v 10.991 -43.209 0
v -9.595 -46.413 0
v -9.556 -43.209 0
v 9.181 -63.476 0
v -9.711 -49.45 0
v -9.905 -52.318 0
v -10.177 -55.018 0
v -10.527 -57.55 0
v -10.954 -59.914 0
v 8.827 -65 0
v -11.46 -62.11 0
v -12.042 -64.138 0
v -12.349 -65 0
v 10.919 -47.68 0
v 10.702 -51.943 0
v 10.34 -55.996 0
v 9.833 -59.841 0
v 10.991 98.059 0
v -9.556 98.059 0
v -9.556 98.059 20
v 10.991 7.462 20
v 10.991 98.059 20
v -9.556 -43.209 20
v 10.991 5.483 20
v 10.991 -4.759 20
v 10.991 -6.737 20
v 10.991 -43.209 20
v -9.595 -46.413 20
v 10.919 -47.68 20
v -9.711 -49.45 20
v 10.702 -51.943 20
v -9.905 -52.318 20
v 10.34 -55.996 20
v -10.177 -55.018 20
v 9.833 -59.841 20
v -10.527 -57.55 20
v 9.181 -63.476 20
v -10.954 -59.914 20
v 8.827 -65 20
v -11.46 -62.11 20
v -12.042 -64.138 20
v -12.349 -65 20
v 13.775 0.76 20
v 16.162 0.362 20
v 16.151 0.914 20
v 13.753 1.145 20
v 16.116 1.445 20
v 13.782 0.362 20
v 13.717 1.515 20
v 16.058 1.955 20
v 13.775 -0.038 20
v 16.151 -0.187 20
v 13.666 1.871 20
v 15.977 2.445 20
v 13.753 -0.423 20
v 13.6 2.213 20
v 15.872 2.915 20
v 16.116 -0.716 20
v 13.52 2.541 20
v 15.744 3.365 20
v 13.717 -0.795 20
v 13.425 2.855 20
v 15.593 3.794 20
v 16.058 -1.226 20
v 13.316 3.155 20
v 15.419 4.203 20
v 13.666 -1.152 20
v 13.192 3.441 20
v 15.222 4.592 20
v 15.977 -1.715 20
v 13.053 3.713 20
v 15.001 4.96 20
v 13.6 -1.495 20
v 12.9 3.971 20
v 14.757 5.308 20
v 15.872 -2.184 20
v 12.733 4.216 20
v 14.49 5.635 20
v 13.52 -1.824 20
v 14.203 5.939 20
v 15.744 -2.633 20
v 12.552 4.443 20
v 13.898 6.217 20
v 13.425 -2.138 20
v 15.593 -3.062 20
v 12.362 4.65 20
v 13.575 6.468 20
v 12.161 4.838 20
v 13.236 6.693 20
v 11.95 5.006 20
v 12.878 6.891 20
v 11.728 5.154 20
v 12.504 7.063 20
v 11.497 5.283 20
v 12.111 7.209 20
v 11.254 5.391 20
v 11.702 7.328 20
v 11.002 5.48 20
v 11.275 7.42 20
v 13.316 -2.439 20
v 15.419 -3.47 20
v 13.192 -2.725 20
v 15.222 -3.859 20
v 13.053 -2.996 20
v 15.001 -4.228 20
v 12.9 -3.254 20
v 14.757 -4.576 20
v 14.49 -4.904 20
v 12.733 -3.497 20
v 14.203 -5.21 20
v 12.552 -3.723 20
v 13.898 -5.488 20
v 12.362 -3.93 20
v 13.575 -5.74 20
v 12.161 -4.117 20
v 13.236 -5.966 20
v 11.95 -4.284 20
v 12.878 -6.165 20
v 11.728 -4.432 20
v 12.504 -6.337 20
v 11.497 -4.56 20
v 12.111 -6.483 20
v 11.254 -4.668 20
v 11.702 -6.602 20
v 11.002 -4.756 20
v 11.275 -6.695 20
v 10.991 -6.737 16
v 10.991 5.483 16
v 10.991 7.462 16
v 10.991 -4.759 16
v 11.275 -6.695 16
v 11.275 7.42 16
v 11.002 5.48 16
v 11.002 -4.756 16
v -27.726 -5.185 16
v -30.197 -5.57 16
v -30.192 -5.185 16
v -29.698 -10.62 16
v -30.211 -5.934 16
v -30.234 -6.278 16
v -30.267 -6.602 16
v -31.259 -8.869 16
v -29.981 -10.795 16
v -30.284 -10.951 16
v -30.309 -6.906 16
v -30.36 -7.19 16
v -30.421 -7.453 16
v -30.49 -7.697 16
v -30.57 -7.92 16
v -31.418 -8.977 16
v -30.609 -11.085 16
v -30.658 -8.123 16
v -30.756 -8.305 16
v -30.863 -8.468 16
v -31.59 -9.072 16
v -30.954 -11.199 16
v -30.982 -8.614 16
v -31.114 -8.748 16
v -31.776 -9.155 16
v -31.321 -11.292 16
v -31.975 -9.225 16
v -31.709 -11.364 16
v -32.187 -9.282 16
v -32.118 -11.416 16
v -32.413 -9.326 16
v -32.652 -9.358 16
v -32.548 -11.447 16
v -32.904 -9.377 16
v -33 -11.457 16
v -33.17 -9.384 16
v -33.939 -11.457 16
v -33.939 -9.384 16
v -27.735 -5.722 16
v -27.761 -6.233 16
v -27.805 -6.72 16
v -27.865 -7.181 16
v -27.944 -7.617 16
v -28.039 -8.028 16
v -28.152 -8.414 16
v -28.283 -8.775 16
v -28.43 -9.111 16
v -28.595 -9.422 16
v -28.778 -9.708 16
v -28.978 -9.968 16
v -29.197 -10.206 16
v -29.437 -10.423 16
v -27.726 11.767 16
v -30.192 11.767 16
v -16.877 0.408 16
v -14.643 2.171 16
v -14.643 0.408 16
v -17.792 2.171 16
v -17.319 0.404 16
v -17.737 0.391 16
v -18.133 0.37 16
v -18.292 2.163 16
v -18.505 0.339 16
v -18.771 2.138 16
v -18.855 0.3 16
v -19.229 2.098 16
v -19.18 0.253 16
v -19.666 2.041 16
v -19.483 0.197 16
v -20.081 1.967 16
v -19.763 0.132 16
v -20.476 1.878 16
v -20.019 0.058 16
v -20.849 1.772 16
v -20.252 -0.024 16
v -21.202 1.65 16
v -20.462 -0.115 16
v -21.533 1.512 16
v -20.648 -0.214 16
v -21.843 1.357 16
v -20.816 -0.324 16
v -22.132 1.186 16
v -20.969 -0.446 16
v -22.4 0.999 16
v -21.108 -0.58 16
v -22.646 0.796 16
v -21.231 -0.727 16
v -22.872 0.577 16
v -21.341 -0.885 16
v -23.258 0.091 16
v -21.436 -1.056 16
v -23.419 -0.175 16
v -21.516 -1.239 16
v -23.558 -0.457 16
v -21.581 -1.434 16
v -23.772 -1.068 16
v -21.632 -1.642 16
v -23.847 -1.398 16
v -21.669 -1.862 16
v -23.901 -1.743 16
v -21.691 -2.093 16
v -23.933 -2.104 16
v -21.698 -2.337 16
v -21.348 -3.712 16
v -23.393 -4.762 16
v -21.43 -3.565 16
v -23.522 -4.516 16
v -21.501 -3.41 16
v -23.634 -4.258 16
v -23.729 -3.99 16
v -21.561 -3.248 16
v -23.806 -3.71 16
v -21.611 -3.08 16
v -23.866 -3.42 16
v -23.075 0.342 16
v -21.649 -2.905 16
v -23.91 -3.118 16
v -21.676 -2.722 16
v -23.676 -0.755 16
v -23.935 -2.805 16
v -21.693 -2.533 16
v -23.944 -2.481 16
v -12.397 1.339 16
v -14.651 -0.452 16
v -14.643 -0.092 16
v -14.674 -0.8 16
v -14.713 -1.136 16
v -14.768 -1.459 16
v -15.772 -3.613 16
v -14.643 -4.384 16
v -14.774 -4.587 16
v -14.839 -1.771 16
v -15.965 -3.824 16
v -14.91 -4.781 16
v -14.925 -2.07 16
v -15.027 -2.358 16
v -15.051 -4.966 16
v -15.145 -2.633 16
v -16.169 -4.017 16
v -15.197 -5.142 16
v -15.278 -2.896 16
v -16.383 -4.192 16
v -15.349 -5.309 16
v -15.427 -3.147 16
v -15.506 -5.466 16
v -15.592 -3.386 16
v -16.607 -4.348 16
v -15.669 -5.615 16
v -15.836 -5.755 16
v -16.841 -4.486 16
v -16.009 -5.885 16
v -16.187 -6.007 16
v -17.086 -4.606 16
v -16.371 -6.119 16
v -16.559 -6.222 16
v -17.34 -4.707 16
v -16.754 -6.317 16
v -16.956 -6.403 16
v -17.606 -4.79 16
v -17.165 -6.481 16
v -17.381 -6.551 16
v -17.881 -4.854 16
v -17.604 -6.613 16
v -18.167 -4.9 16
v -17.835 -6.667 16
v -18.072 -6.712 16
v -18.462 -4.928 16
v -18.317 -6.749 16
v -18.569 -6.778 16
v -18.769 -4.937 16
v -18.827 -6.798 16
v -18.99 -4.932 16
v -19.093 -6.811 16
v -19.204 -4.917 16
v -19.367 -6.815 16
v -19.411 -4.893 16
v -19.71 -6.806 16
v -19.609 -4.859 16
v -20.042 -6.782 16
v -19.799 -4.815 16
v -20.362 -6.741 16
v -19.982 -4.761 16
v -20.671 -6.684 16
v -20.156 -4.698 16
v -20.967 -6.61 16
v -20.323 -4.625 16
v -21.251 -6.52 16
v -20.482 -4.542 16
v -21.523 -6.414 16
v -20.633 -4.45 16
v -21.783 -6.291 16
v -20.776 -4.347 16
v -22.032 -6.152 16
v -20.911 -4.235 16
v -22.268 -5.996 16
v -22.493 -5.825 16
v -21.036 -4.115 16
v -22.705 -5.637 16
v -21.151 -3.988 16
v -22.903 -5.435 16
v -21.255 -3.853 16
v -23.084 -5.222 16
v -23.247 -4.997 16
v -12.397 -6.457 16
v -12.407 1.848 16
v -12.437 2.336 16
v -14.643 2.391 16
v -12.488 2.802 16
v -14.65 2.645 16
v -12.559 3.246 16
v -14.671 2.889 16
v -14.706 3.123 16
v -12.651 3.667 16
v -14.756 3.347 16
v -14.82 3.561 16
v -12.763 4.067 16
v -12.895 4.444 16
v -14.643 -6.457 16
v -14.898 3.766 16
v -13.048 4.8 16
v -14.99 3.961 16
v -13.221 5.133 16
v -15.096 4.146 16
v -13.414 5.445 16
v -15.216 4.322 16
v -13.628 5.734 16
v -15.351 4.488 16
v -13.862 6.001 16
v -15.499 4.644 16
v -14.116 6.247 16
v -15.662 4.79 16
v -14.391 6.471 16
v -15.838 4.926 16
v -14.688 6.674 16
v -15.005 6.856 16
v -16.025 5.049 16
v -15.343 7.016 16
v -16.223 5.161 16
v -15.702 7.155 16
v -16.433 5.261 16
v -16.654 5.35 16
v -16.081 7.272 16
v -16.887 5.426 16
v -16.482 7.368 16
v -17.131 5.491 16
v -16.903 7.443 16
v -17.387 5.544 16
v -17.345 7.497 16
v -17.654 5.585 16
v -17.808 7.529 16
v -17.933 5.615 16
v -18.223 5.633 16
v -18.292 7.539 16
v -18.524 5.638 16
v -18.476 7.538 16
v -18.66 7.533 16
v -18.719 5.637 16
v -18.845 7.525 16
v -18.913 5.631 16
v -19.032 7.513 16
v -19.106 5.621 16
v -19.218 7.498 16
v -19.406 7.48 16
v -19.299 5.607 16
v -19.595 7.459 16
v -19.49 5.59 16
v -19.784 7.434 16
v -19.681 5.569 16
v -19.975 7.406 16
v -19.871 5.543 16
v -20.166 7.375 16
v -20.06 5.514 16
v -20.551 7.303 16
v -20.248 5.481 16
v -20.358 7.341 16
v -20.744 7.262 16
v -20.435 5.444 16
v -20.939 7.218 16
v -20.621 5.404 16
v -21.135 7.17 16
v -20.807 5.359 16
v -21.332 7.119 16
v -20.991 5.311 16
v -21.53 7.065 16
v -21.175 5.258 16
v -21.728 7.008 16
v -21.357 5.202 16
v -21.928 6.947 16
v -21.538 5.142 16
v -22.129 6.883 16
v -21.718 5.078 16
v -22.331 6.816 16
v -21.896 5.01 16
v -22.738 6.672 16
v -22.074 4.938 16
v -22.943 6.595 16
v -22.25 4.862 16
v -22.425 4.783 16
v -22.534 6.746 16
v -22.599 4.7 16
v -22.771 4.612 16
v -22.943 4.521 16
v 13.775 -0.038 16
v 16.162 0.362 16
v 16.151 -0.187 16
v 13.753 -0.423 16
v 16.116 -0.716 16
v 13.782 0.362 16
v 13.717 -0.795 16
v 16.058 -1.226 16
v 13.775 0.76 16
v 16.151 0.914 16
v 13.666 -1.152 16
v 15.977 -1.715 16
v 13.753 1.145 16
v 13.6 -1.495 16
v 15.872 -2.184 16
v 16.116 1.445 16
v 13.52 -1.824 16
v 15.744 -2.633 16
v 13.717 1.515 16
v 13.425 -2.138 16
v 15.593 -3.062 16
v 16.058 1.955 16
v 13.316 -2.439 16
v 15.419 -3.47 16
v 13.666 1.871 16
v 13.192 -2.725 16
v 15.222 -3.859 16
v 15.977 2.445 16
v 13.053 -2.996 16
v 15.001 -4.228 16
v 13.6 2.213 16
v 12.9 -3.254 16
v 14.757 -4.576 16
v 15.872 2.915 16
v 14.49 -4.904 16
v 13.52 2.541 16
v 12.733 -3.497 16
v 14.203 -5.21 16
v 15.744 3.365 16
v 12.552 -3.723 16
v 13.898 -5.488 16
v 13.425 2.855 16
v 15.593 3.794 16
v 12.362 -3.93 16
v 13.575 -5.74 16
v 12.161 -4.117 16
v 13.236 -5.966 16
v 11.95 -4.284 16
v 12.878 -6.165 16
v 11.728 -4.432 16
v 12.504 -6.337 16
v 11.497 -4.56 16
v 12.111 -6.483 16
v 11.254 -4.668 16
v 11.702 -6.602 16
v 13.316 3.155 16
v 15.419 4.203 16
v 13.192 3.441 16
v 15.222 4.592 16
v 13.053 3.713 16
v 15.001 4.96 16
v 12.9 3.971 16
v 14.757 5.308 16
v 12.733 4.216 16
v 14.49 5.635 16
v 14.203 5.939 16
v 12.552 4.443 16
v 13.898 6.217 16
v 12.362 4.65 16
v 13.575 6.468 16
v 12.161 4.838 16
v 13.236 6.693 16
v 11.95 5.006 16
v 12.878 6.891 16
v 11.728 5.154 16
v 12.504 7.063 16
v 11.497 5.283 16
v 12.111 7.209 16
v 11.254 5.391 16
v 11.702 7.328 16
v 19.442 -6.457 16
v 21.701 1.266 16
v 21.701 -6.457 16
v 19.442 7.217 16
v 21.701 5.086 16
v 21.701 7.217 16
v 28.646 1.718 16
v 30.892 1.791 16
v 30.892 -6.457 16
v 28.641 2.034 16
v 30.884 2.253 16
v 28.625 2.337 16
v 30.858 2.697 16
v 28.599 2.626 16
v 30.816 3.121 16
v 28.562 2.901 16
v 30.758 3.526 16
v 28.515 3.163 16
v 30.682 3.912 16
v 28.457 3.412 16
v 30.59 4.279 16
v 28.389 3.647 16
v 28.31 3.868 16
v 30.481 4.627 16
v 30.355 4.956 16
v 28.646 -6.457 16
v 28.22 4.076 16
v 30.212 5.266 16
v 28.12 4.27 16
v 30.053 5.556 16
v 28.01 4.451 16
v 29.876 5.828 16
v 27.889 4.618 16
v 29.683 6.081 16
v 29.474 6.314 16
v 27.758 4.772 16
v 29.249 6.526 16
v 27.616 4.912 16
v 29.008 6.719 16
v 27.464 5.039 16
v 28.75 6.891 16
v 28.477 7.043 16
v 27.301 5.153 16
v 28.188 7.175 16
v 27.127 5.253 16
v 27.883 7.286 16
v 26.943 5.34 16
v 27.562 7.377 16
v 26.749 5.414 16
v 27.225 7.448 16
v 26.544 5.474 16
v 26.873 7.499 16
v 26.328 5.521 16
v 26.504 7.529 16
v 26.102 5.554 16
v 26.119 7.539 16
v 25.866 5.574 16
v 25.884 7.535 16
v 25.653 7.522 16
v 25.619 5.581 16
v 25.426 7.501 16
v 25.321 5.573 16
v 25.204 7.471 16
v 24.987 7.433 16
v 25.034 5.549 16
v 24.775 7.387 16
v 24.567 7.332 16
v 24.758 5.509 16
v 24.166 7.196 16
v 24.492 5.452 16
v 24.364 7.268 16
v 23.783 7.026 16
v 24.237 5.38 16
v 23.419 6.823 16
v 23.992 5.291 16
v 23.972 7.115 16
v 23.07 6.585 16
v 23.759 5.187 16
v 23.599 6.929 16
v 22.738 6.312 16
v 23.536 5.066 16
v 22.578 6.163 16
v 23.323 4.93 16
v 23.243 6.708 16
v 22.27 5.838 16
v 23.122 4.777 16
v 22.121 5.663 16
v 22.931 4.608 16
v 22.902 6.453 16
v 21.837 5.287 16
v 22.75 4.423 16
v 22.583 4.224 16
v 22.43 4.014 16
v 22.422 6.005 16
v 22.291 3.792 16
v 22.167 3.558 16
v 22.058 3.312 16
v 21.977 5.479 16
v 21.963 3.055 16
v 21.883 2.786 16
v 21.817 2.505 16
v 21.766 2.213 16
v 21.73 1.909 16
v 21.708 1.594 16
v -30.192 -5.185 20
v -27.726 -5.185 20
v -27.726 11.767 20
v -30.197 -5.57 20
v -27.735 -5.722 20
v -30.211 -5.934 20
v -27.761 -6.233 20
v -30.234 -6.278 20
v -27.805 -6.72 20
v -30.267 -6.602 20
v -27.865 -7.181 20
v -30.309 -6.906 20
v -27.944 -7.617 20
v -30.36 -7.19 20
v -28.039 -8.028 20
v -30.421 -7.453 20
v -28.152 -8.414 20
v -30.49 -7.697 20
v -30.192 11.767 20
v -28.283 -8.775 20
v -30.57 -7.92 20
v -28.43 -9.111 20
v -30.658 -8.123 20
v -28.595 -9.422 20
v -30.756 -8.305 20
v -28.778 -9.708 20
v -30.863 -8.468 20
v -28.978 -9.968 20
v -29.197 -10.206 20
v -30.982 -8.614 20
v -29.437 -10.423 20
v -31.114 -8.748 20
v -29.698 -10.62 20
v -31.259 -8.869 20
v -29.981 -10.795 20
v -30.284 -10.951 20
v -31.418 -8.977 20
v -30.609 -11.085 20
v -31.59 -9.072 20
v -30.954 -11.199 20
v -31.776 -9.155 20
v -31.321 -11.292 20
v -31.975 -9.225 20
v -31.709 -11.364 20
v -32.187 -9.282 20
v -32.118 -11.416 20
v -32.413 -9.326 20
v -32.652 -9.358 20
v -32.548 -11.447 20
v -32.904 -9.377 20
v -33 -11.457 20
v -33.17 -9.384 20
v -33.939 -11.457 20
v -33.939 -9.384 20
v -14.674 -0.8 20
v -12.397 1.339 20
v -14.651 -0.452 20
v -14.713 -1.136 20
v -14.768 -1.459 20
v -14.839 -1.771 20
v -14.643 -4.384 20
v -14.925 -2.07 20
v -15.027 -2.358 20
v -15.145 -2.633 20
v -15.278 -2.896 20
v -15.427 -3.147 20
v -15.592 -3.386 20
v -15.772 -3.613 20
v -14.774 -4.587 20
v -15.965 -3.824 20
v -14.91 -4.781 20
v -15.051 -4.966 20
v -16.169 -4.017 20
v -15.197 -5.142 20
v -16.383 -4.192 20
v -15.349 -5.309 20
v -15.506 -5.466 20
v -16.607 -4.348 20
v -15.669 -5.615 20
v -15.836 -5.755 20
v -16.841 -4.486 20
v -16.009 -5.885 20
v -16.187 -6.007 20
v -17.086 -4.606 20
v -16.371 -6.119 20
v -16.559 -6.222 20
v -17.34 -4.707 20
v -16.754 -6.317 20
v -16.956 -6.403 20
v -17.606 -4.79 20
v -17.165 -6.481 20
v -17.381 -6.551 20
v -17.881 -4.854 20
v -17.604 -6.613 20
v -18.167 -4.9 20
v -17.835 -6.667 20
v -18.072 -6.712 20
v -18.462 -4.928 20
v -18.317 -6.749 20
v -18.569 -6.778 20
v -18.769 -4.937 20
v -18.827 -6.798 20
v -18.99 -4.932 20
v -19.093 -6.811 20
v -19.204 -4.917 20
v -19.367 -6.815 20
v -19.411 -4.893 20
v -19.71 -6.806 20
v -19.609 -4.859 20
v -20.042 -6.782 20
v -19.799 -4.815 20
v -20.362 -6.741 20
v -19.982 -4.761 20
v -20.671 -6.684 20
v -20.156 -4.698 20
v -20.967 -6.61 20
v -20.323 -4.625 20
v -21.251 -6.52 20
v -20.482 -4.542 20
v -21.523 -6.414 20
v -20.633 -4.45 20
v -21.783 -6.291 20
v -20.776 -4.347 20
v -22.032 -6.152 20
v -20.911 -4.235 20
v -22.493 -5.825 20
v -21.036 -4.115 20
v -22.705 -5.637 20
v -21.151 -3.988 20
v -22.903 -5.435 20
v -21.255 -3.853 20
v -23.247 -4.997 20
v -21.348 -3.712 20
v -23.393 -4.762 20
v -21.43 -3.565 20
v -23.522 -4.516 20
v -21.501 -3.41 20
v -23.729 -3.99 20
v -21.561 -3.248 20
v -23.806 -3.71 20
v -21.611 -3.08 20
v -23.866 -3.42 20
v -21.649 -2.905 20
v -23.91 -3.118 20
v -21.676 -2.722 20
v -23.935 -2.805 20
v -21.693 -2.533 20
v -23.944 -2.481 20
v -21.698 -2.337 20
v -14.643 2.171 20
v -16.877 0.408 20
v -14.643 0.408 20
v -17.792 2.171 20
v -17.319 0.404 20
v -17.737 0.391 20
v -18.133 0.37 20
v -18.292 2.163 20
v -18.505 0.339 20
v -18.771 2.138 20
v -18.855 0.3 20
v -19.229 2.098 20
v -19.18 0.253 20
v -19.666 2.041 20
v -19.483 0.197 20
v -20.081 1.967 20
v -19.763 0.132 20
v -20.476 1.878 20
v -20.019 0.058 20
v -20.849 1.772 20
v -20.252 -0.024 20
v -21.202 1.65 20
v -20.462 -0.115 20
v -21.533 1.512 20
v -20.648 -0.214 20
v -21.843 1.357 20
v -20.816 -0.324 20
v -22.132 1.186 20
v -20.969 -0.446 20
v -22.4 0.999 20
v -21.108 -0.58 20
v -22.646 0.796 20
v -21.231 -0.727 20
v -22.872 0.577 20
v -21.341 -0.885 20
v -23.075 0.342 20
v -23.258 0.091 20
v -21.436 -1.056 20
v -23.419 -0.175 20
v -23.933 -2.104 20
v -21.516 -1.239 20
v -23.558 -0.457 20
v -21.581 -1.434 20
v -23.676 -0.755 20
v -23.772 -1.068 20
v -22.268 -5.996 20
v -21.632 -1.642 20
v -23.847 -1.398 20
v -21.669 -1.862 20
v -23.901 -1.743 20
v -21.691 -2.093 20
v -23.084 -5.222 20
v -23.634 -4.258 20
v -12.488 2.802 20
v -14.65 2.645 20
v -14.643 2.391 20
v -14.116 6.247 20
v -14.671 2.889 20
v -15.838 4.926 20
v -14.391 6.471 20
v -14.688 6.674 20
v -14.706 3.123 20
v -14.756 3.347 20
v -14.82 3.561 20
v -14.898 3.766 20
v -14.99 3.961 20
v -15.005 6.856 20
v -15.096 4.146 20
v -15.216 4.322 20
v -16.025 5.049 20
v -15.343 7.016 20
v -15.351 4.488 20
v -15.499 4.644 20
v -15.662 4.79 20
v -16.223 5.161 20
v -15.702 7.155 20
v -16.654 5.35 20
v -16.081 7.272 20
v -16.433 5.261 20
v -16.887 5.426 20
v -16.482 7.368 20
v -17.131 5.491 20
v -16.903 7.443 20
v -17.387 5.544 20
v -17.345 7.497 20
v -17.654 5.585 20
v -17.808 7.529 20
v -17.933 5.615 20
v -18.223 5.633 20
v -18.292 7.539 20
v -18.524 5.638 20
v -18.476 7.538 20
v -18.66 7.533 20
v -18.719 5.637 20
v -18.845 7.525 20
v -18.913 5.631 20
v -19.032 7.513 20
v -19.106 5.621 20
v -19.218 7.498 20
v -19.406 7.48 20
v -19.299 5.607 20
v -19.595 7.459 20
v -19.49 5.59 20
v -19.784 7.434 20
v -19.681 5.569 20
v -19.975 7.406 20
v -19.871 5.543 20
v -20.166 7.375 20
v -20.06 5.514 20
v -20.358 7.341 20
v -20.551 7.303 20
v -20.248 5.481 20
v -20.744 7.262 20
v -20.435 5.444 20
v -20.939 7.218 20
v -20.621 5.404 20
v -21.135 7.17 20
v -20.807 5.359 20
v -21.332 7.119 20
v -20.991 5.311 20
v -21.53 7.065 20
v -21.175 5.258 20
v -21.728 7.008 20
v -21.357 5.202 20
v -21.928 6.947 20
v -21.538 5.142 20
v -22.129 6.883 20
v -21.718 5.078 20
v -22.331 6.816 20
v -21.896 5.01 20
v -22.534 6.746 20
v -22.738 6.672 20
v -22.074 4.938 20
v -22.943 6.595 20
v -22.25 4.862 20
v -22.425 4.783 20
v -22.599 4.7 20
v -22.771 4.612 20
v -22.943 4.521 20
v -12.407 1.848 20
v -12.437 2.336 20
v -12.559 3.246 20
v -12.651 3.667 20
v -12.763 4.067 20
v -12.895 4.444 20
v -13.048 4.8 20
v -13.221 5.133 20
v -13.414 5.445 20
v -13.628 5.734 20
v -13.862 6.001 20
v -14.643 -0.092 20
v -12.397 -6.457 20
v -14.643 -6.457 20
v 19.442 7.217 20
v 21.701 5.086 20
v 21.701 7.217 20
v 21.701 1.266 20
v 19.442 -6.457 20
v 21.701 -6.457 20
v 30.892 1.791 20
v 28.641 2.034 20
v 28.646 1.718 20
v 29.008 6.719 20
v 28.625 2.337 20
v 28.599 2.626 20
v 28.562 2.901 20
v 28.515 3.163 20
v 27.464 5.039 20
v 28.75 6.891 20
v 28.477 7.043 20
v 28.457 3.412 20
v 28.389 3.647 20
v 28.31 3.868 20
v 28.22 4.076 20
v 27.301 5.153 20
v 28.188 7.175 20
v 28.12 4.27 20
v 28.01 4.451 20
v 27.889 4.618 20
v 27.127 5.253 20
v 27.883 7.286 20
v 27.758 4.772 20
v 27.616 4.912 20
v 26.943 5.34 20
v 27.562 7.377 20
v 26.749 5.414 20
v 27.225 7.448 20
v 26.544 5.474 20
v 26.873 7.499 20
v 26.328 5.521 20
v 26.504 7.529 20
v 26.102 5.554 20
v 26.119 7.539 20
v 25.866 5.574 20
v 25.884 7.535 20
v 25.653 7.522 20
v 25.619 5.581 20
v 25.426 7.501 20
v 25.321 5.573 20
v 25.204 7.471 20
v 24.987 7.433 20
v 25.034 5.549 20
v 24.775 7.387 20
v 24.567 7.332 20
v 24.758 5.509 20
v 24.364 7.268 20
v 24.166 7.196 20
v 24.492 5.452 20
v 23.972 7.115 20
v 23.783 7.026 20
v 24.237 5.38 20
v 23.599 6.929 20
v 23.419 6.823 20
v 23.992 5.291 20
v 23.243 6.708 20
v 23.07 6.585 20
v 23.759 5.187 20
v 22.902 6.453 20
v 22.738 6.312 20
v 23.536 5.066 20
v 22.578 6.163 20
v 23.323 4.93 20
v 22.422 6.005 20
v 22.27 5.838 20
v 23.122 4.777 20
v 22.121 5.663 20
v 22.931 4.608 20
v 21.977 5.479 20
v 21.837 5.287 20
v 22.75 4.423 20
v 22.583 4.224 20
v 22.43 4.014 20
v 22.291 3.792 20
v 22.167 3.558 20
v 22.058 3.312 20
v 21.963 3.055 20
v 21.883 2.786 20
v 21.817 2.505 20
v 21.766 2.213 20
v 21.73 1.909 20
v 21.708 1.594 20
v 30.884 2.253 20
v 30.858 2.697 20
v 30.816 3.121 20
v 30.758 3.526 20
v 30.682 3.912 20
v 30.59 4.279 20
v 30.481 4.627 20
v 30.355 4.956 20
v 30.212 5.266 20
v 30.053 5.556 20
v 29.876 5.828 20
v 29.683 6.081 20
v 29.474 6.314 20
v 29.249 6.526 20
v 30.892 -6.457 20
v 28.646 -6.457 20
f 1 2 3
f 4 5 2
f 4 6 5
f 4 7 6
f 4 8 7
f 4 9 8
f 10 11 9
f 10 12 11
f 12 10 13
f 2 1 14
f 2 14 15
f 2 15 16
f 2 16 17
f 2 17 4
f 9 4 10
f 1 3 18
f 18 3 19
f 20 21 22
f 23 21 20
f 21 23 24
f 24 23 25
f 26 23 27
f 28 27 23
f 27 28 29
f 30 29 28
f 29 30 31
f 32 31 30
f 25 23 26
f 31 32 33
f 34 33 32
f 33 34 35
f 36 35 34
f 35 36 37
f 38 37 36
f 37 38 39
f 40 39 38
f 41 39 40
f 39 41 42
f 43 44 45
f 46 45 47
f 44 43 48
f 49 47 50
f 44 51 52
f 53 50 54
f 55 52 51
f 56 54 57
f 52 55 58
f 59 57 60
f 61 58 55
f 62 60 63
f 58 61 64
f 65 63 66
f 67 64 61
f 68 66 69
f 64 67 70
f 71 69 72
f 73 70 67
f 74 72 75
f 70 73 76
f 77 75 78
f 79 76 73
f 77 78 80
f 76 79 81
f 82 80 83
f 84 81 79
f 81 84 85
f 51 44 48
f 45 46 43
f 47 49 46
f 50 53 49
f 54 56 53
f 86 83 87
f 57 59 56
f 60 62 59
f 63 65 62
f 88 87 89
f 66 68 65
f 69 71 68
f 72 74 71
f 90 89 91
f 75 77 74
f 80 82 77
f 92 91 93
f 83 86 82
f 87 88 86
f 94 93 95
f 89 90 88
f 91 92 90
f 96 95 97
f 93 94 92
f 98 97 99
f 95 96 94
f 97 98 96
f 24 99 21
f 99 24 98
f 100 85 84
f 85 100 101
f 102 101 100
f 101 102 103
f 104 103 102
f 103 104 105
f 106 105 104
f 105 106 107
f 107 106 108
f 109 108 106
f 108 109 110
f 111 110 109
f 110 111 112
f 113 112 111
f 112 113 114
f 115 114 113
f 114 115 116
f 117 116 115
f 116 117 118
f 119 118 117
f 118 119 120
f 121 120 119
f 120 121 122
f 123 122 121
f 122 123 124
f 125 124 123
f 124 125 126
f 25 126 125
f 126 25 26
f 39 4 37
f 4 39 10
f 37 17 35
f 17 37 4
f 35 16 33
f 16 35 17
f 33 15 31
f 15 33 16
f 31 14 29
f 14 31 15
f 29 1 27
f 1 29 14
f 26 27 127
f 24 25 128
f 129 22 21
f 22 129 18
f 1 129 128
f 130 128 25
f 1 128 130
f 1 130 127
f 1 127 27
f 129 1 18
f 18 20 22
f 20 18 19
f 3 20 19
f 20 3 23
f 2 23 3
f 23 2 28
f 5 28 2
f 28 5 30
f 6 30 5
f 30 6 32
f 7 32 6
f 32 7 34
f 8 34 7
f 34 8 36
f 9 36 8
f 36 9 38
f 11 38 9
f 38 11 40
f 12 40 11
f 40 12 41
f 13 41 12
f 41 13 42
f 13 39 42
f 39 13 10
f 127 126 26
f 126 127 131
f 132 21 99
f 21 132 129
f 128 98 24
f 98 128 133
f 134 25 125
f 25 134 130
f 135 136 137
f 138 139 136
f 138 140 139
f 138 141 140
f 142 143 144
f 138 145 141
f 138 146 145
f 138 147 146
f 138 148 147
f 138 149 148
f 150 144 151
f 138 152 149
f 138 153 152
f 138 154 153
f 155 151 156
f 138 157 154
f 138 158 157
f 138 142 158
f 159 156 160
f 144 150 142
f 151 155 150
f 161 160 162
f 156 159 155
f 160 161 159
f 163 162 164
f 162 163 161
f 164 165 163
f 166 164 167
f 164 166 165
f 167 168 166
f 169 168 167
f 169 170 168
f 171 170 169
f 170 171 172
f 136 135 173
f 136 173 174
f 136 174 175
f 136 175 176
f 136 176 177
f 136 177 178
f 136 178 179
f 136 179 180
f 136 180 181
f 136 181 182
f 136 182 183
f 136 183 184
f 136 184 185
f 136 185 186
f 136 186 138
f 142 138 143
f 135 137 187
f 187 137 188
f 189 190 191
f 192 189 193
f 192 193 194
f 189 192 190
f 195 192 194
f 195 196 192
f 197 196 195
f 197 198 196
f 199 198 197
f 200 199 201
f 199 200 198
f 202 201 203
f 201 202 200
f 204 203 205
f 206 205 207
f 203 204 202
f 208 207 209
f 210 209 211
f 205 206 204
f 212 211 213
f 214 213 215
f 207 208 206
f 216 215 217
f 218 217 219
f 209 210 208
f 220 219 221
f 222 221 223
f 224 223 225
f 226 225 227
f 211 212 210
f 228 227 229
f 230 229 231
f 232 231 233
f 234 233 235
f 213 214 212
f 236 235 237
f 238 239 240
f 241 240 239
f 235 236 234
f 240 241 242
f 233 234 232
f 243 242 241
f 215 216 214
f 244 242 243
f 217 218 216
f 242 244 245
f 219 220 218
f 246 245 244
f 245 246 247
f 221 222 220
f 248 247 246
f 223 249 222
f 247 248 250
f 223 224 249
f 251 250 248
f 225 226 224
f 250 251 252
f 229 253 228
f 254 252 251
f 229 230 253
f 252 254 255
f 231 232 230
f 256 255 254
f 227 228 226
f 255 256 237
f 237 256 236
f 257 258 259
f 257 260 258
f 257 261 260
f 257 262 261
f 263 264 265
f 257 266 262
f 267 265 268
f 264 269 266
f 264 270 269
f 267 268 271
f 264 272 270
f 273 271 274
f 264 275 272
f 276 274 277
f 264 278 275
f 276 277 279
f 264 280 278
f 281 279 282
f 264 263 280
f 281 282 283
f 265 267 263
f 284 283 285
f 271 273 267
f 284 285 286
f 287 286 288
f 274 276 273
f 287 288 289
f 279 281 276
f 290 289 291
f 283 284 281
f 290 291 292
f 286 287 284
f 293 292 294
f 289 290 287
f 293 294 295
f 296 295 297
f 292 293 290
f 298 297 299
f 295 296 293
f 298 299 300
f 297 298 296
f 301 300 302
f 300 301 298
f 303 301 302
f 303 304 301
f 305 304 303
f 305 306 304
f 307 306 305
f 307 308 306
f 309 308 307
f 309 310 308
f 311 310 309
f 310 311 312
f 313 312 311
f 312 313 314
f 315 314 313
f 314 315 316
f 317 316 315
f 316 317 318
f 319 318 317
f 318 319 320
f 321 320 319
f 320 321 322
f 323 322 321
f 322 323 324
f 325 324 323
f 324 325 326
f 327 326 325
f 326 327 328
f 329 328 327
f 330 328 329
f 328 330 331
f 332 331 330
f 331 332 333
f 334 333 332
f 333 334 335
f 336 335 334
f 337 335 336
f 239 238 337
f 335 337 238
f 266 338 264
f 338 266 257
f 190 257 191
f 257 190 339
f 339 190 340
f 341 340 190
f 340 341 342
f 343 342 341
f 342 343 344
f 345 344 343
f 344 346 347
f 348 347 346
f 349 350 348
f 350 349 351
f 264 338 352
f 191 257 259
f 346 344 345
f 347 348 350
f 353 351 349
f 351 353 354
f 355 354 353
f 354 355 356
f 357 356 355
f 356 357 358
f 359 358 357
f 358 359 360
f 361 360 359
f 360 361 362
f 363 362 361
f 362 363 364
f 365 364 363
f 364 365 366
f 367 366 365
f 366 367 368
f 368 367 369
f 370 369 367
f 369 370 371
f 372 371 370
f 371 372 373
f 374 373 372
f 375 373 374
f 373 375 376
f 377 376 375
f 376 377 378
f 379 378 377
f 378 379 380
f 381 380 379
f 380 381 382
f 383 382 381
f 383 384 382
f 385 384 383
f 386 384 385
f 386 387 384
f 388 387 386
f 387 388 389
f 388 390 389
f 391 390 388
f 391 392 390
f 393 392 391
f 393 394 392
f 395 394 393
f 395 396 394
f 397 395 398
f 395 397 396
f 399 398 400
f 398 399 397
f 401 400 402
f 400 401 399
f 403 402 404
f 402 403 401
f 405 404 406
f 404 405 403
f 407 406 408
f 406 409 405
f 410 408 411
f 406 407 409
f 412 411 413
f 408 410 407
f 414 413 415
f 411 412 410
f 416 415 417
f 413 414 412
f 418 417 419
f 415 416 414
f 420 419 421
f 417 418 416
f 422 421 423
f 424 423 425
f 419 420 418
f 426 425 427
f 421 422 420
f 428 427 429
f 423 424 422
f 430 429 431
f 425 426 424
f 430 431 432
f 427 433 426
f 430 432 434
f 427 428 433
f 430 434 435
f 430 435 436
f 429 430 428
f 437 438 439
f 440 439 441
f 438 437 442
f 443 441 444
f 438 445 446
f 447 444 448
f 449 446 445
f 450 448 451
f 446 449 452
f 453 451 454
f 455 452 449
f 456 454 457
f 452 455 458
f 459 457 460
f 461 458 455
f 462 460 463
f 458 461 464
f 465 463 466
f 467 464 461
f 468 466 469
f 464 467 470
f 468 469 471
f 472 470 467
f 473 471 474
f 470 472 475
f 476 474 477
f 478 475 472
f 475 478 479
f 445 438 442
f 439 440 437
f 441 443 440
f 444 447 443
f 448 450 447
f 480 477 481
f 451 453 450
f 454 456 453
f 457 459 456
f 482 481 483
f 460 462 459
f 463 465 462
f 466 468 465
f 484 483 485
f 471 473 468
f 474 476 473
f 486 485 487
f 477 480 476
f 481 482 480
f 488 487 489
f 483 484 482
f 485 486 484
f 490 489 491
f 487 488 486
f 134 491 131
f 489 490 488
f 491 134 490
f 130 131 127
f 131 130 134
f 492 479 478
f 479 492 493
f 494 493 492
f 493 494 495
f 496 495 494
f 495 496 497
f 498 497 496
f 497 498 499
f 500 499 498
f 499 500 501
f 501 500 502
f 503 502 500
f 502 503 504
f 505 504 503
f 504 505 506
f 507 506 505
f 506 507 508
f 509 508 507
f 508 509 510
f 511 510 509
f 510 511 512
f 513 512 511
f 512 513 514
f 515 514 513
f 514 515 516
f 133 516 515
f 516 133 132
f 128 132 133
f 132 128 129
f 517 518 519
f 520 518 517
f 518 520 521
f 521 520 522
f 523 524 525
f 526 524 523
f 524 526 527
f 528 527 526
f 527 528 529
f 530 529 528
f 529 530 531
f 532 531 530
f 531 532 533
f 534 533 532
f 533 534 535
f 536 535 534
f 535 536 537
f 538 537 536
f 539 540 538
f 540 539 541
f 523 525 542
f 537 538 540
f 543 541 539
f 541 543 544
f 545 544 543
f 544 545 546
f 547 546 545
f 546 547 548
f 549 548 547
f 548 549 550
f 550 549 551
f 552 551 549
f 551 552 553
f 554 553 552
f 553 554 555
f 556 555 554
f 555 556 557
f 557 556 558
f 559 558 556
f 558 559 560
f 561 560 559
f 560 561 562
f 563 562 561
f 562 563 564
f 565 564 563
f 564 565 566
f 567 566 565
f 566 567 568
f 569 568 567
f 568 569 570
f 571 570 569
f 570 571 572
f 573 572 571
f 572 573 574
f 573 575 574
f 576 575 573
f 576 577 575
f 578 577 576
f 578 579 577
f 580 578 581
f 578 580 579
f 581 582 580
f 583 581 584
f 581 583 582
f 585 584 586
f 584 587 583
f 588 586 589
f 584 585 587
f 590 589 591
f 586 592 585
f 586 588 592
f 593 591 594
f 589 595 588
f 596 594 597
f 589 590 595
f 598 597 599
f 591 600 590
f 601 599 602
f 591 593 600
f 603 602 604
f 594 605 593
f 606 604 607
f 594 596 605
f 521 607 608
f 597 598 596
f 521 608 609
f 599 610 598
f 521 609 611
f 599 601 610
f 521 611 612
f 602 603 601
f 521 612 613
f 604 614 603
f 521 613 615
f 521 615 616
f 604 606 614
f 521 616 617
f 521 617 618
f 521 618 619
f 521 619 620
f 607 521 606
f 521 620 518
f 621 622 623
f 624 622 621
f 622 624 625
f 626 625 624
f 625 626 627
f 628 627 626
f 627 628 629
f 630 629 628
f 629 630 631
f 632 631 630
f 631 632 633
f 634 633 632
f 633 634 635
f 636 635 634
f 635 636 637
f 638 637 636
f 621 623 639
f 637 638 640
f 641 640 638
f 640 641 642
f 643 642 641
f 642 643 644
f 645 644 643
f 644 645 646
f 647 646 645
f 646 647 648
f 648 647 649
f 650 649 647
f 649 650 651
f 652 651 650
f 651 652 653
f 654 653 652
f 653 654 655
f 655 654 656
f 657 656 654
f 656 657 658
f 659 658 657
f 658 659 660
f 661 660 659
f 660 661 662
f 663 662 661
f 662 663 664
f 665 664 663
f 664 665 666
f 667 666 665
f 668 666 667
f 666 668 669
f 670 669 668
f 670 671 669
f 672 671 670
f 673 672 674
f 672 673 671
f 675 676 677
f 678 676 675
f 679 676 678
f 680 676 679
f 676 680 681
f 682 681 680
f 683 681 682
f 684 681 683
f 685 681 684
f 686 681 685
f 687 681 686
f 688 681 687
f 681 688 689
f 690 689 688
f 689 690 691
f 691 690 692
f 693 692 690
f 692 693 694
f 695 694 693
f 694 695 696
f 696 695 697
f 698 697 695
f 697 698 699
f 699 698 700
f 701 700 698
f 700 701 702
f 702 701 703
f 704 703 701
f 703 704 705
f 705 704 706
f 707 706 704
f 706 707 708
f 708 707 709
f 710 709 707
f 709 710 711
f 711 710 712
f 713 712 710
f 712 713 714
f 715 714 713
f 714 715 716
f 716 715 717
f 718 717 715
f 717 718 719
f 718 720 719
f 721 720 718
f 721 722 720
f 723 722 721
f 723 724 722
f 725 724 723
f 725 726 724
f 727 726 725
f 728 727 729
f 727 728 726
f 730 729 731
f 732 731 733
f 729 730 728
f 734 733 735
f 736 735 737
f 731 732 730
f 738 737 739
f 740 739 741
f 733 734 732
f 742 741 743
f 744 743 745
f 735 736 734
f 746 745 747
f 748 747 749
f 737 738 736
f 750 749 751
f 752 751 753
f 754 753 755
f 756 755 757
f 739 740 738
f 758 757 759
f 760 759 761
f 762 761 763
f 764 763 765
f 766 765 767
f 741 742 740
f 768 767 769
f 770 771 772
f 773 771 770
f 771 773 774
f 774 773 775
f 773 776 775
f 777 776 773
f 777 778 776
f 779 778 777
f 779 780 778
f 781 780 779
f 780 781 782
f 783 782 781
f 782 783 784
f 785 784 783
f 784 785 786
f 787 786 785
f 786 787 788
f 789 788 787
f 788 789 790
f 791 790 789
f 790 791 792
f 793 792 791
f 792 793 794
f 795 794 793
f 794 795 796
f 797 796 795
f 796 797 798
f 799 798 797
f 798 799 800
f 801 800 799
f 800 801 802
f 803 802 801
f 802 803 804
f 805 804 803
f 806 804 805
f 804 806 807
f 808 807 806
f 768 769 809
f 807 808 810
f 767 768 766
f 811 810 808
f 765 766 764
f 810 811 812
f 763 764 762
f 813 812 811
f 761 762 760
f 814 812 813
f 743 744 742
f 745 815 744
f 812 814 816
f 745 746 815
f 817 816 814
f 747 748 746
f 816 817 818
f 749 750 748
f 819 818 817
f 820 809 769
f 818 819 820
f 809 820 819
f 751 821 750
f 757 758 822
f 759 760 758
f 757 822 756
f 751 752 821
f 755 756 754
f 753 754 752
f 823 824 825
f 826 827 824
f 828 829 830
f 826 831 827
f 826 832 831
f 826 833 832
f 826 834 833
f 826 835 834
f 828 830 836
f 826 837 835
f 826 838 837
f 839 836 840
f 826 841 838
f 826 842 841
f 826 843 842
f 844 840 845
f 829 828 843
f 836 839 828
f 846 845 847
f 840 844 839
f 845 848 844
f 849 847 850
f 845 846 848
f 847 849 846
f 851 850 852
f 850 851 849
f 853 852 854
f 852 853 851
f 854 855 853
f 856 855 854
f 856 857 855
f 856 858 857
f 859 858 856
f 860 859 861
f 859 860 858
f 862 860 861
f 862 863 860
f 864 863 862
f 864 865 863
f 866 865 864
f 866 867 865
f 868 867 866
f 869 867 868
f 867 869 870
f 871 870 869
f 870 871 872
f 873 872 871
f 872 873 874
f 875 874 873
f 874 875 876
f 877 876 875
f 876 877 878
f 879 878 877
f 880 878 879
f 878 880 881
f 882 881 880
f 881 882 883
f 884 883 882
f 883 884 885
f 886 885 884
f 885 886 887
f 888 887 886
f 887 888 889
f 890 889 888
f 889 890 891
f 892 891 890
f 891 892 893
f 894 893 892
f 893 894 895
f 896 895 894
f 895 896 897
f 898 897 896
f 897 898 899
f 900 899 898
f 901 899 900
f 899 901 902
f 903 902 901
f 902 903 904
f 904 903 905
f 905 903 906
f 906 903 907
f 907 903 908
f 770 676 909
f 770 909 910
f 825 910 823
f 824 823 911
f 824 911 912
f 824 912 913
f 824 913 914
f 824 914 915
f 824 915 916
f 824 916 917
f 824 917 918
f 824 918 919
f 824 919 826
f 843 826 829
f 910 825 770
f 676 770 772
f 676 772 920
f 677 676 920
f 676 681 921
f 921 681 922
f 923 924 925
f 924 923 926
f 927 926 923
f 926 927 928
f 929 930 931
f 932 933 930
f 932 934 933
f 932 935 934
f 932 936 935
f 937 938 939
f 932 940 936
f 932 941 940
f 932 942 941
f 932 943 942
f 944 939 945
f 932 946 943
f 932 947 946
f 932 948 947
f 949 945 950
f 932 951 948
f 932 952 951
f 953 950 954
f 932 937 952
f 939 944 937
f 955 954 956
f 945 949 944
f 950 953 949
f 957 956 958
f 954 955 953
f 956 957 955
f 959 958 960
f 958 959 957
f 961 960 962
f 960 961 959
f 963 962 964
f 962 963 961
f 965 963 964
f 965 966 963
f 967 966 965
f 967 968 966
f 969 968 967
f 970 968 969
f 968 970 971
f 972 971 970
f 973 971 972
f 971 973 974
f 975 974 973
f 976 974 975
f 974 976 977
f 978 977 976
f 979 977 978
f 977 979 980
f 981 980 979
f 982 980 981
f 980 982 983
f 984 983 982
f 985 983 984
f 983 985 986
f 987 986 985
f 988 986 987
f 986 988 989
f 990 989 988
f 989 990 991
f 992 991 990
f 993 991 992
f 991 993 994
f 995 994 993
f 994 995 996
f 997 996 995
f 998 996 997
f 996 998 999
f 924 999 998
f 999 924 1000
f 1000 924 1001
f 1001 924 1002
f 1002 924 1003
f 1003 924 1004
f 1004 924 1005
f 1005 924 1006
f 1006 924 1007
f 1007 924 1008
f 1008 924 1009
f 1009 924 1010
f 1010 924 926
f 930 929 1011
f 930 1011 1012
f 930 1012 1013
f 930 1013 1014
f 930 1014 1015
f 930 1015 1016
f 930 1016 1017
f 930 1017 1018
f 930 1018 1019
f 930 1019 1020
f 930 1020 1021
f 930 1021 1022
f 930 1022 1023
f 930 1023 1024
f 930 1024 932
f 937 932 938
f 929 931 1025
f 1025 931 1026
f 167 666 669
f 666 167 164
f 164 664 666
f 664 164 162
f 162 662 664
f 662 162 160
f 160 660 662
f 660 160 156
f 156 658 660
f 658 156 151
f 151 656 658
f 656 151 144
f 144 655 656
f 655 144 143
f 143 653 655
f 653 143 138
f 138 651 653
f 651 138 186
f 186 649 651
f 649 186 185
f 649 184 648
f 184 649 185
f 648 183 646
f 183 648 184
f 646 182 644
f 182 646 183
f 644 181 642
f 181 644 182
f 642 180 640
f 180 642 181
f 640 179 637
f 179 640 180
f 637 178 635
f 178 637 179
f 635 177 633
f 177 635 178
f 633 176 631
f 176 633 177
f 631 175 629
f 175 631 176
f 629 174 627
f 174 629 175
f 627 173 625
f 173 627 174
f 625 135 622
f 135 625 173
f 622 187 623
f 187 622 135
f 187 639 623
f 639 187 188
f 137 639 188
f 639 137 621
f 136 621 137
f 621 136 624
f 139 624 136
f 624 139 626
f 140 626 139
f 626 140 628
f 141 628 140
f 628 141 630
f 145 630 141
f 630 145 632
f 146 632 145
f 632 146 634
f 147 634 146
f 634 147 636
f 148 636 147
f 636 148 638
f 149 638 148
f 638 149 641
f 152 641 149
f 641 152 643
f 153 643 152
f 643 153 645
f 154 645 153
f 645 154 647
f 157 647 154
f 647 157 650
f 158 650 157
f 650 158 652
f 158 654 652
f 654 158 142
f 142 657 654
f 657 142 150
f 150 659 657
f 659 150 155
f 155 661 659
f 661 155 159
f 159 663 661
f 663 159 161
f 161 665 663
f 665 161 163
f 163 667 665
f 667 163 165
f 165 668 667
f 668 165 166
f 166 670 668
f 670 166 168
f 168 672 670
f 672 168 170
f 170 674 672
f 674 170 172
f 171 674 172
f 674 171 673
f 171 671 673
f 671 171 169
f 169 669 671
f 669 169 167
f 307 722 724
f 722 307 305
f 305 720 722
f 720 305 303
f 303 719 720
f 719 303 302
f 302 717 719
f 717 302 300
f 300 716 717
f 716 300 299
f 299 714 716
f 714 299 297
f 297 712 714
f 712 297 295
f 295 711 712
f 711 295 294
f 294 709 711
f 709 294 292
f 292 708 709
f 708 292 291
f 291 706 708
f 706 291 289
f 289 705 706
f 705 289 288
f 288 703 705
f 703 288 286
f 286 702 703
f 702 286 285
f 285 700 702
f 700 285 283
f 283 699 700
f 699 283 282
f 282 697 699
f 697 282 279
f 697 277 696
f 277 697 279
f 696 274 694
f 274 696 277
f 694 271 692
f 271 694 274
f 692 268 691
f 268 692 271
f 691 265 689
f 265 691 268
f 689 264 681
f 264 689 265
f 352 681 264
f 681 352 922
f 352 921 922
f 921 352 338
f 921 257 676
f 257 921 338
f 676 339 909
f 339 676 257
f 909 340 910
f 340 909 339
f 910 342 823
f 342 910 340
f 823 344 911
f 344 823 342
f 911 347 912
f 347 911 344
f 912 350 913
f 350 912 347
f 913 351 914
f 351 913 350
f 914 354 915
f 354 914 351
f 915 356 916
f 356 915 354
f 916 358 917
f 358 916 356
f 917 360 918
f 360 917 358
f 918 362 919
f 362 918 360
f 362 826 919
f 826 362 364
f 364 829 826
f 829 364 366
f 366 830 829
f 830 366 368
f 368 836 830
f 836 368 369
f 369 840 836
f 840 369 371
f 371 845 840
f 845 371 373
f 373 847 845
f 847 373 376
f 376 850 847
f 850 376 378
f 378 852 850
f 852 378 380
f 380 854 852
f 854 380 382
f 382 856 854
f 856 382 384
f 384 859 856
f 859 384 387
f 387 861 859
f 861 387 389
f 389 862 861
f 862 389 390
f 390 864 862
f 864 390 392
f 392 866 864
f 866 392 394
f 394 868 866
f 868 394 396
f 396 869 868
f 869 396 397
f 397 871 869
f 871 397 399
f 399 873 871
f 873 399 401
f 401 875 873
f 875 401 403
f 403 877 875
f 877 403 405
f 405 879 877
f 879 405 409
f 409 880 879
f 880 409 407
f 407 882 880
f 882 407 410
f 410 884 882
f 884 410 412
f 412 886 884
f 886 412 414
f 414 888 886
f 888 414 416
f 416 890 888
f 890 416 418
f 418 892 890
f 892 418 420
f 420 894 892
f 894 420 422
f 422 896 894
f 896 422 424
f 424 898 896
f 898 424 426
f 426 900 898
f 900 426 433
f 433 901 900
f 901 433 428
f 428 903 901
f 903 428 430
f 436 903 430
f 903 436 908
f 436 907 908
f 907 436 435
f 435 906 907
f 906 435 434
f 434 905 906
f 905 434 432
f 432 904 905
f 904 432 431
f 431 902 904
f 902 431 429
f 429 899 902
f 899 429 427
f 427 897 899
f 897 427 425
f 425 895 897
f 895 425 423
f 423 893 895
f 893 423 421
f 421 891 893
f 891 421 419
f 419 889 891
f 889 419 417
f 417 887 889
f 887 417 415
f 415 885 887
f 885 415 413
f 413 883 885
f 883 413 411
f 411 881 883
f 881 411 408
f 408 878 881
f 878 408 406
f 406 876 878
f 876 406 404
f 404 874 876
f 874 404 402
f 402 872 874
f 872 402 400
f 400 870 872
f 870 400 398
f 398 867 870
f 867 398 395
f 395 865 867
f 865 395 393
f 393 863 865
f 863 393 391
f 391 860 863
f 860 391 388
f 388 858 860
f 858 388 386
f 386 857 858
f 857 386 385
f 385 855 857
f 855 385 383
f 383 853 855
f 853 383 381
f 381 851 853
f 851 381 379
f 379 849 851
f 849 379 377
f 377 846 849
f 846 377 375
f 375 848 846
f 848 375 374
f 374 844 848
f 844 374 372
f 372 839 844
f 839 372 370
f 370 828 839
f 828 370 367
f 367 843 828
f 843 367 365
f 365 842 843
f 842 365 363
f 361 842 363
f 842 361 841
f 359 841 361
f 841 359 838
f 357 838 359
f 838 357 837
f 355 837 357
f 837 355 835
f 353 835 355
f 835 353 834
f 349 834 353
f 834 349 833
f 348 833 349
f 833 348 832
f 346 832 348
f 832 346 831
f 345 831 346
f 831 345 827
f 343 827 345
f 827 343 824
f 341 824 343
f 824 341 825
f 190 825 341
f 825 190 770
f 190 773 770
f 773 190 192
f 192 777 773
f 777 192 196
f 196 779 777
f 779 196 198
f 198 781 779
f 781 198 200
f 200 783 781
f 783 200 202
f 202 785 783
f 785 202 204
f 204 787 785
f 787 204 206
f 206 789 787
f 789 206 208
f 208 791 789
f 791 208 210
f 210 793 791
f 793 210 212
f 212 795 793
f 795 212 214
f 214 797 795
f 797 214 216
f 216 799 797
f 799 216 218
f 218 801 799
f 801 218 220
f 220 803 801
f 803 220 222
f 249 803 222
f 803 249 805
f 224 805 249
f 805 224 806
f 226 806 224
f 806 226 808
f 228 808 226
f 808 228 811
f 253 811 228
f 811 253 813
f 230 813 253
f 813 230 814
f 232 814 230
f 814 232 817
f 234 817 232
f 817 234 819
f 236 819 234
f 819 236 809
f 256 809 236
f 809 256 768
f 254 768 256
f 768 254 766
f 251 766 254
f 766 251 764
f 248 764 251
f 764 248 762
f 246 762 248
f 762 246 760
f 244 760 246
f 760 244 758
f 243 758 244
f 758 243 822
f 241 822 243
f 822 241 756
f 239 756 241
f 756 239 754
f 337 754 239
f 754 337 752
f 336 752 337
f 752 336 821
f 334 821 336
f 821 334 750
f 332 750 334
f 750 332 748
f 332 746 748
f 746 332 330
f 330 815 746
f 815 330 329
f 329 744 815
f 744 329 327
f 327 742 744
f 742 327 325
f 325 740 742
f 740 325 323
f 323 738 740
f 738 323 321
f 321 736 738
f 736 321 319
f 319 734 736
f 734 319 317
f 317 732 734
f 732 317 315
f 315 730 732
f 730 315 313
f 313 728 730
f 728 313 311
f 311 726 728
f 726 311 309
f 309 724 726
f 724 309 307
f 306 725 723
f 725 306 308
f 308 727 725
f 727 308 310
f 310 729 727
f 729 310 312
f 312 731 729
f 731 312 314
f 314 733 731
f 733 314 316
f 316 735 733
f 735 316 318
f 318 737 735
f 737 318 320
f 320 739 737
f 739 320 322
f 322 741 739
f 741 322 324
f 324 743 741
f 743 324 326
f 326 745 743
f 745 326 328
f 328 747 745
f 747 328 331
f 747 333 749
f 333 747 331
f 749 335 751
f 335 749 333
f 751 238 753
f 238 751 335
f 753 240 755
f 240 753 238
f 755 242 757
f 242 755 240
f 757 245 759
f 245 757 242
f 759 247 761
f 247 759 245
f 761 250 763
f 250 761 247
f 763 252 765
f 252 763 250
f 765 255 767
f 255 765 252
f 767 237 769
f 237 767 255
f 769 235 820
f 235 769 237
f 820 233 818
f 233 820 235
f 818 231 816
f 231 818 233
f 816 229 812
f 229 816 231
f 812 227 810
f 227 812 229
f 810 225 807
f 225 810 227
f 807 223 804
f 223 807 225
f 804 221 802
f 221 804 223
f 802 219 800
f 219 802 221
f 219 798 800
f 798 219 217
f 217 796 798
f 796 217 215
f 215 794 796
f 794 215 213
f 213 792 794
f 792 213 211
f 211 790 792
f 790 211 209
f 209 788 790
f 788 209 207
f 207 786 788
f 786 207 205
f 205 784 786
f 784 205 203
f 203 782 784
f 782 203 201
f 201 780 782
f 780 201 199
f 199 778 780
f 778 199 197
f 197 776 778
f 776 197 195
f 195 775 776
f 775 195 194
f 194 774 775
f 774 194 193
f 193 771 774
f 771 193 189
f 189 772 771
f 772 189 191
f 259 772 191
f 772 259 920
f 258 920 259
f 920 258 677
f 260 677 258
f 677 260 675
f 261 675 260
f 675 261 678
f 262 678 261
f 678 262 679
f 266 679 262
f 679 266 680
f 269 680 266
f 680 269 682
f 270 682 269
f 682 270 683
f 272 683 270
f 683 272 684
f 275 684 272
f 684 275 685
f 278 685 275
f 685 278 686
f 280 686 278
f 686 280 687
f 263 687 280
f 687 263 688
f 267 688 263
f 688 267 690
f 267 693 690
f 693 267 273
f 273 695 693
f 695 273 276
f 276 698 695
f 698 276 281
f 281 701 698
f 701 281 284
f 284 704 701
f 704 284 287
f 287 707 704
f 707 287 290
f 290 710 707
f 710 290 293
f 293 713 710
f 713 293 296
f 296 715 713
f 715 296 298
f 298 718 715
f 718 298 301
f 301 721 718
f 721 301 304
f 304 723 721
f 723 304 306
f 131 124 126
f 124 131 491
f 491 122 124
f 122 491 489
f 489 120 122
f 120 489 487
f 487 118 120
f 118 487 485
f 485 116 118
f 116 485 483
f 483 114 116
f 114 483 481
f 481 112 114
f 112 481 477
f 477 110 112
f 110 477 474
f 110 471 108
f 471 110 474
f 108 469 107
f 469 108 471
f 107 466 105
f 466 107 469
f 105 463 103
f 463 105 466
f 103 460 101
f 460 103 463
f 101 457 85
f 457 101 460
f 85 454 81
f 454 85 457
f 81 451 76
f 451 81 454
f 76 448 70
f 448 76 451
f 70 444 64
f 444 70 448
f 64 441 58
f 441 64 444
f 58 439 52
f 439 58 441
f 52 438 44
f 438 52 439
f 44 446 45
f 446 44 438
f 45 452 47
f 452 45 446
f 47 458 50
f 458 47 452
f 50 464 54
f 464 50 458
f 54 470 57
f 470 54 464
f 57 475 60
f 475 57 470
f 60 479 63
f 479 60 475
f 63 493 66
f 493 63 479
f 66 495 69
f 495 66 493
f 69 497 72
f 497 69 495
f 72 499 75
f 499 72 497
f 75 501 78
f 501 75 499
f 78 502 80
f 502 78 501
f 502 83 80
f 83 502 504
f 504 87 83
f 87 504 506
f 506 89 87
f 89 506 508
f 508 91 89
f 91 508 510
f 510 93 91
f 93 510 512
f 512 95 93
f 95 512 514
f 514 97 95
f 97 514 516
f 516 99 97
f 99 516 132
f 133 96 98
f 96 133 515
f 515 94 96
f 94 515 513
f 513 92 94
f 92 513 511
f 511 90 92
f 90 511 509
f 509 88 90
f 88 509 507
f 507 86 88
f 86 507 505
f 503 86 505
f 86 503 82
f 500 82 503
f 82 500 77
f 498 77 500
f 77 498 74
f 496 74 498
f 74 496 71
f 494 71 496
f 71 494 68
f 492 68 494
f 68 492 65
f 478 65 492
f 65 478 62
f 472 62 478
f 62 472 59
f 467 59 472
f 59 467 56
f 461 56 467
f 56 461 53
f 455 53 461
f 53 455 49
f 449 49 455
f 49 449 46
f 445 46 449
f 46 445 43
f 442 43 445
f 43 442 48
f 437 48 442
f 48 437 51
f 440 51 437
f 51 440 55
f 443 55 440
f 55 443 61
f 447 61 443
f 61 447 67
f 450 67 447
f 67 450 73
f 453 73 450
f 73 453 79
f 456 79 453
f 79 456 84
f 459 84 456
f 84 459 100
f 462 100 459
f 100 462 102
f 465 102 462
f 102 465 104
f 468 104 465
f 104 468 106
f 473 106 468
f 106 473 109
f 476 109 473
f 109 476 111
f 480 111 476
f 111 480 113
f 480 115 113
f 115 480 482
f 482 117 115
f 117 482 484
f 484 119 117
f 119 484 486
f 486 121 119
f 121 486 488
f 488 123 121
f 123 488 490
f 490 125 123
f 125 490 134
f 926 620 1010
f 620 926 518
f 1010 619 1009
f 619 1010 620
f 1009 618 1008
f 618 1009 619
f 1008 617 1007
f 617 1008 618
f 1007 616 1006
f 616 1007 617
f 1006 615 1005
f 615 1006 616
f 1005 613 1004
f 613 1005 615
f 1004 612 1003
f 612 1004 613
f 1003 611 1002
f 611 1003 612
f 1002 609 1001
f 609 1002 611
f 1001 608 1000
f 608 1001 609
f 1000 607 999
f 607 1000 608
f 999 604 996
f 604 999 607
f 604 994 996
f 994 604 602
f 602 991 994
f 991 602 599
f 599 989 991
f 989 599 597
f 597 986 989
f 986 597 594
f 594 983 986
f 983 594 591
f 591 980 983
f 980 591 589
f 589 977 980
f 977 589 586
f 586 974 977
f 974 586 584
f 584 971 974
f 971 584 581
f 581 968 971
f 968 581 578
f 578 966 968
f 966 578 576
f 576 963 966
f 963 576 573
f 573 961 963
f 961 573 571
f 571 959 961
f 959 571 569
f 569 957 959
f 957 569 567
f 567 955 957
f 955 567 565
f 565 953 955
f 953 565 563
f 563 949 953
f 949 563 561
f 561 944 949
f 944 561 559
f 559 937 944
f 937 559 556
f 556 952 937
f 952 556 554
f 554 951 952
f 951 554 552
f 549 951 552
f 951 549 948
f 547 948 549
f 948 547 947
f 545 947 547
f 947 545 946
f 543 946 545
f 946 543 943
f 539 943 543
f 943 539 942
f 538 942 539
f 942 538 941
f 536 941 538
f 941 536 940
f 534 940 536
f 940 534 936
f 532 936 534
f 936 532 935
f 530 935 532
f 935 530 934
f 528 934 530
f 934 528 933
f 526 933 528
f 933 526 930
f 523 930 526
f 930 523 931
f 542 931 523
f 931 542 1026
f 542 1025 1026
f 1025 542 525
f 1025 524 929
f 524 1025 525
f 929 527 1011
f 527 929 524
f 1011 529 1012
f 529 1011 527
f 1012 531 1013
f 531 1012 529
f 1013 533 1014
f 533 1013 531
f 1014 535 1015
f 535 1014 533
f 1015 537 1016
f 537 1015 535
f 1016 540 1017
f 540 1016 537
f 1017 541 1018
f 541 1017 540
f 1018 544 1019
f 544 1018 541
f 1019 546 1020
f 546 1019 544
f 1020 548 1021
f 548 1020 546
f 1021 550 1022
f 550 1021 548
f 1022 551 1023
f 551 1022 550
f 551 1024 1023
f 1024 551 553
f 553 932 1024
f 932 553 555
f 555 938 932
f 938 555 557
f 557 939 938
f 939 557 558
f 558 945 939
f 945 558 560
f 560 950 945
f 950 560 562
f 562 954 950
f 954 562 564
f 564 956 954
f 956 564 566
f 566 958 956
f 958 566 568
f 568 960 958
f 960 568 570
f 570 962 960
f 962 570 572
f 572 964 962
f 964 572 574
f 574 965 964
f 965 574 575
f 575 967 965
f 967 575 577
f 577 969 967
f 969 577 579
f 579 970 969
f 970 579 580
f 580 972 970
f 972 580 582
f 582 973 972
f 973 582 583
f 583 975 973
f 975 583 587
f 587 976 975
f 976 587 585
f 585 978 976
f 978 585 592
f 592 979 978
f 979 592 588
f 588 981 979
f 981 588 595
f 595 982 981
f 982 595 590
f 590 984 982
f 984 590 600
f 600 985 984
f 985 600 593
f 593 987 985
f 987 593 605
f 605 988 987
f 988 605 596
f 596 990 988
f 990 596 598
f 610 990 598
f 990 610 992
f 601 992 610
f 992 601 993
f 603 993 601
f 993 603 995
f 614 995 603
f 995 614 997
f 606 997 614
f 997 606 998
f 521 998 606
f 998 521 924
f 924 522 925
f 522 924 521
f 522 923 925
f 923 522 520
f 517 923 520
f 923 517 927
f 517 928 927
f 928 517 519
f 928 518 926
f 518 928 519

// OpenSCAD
// ============================================================================
// nome_parametrico.scad — NameForge
// ============================================================================

// ── Texte ────────────────────────────────────────────────────────────────────
nome                 = "Jason";
font_base            = "Bebas Neue:style=Regular";
font_corsivo         = "Pacifico:style=Regular";
mostra_base          = 1;
mostra_nome          = 1;

// ── Dimensions (mm) ──────────────────────────────────────────────────────────
altezza_base         = 20;
profondita_incisione = 4;   // 0 = nom affleurant, N = N mm de profondeur
dimensione_lettera   = 150;
dimensione_nome      = 18;
altezza_nome_solido  = 7;   // hauteur totale du bloc nom (incrusté + dépassement)
offset_nome_x        = 0;
offset_nome_y        = 0;
tolleranza           = 0.1;
margine_taglio       = 10;

// nome_preview_z : Z de départ du nom
// preview  : altezza_base - profondita_incisione → nom dans le creux
// export   : 0 → chemin base_avec_nom_export
nome_preview_z       = 0;

// incidi_preview : 1 = générer base avec creux visible
incidi_preview       = 0;

// taglio_base : mm à retirer depuis le bas du bounding box de la lettre
// 0 = pas de coupe (courbe conservée), 30 = coupe haute (lettre très plate)
taglio_base          = 10;

// ── Couleurs ─────────────────────────────────────────────────────────────────
colore_base          = [0.914, 0.580, 0.965];
colore_nome          = [1.000, 1.000, 1.000];

// chanfrein_haut_mm : bord supérieur chanfreiné (biseauté à 45°)
// 0 = désactivé ; ex. 1.5 = chanfrein de 1.5 mm
chanfrein_haut_mm    = 0;

// ── Qualité ──────────────────────────────────────────────────────────────────
$fa = 4;
$fs = 0.4;

// ── Assertions de sécurité ───────────────────────────────────────────────────
assert(len(nome) > 0,
  "Le texte ne peut pas être vide");
assert(profondita_incisione < altezza_base,
  "profondita_incisione doit être < altezza_base");
assert(chanfrein_haut_mm == 0 || chanfrein_haut_mm < altezza_base,
  "chanfrein_haut_mm doit être < altezza_base");
assert(chanfrein_haut_mm == 0 || chanfrein_haut_mm < dimensione_lettera / 2,
  "chanfrein_haut_mm trop grand par rapport à la taille de la lettre");
assert(taglio_base >= 0 && taglio_base < dimensione_lettera * 0.5,
  "taglio_base doit être dans [0, dimensione_lettera/2[");

// ============================================================================
// Modules
// ============================================================================

// Lettre avec bas plat : intersection 3D pour couper la courbe du bas
// taglio_base = 0 → pas de coupe ; taglio_base = 30 → coupe 30 mm depuis le bas
// chanfrein_haut_mm > 0 → biseau 45° sur le bord supérieur
module forme_base() {
    module lettera_2d() {
        text(nome[0],
             size   = dimensione_lettera,
             font   = font_base,
             halign = "center",
             valign = "center");
    }

    module corps() {
        if (chanfrein_haut_mm > 0 && chanfrein_haut_mm < altezza_base) {
            // Parois droites jusqu'à (altezza_base - c), puis biseau sur c mm
            let (c         = chanfrein_haut_mm,
                 scale_top = max(0.01, 1 - 2 * chanfrein_haut_mm / dimensione_lettera)) {
                union() {
                    linear_extrude(height = altezza_base - c, convexity = 10)
                        lettera_2d();
                    translate([0, 0, altezza_base - c])
                        linear_extrude(height = c, convexity = 10, scale = scale_top)
                            lettera_2d();
                }
            }
        } else {
            linear_extrude(height = altezza_base, convexity = 10)
                lettera_2d();
        }
    }

    intersection() {
        corps();
        translate([-dimensione_lettera,
                   -dimensione_lettera * 0.5 + taglio_base,
                   -1])
            cube([dimensione_lettera * 2, dimensione_lettera * 1.5, altezza_base + 2]);
    }
}

module shape_nom() {
    text(nome,
         size   = dimensione_nome,
         font   = font_corsivo,
         halign = "center",
         valign = "center");
}

// Base seule
module base_seule() {
    color(colore_base)
    forme_base();
}

// Base avec creux incrusté visible (pour preview et affichage sans nom)
module base_incisa() {
    color(colore_base)
    difference() {
        forme_base();
        translate([offset_nome_x, offset_nome_y,
                   altezza_base - profondita_incisione + tolleranza])
            linear_extrude(height = profondita_incisione + tolleranza,
                           convexity = 10)
                shape_nom();
    }
}

// Nom seul — Z départ = nome_preview_z, hauteur = altezza_nome_solido
// altezza_nome_solido - profondita_incisione = mm qui dépassent au-dessus du J
module nom_seul() {
    color(colore_nome)
    translate([offset_nome_x, offset_nome_y, nome_preview_z])
        linear_extrude(height = altezza_nome_solido, convexity = 10)
            shape_nom();
}

// Export impression multicolor : creux + bloc nom flush
module base_avec_nom_export() {
    color(colore_base)
    difference() {
        forme_base();
        translate([offset_nome_x, offset_nome_y,
                   altezza_base - profondita_incisione + tolleranza])
            linear_extrude(height = profondita_incisione + tolleranza,
                           convexity = 10)
                shape_nom();
    }
    color(colore_nome)
    translate([offset_nome_x, offset_nome_y,
               altezza_base - profondita_incisione])
        linear_extrude(height = profondita_incisione, convexity = 10)
            shape_nom();
}

// ============================================================================
// Assemblage
// ============================================================================

if (mostra_base && mostra_nome) {
    if (nome_preview_z > 0) {
        if (incidi_preview) base_incisa(); else base_seule();
        nom_seul();
    } else {
        base_avec_nom_export();
    }
}
else if (mostra_base) {
    if (incidi_preview) base_incisa(); else base_seule();
}
else if (mostra_nome) {
    nom_seul();
}
else {
    echo("AVERTISSEMENT: mostra_base=0 ET mostra_nome=0 — rien à générer.");
}
